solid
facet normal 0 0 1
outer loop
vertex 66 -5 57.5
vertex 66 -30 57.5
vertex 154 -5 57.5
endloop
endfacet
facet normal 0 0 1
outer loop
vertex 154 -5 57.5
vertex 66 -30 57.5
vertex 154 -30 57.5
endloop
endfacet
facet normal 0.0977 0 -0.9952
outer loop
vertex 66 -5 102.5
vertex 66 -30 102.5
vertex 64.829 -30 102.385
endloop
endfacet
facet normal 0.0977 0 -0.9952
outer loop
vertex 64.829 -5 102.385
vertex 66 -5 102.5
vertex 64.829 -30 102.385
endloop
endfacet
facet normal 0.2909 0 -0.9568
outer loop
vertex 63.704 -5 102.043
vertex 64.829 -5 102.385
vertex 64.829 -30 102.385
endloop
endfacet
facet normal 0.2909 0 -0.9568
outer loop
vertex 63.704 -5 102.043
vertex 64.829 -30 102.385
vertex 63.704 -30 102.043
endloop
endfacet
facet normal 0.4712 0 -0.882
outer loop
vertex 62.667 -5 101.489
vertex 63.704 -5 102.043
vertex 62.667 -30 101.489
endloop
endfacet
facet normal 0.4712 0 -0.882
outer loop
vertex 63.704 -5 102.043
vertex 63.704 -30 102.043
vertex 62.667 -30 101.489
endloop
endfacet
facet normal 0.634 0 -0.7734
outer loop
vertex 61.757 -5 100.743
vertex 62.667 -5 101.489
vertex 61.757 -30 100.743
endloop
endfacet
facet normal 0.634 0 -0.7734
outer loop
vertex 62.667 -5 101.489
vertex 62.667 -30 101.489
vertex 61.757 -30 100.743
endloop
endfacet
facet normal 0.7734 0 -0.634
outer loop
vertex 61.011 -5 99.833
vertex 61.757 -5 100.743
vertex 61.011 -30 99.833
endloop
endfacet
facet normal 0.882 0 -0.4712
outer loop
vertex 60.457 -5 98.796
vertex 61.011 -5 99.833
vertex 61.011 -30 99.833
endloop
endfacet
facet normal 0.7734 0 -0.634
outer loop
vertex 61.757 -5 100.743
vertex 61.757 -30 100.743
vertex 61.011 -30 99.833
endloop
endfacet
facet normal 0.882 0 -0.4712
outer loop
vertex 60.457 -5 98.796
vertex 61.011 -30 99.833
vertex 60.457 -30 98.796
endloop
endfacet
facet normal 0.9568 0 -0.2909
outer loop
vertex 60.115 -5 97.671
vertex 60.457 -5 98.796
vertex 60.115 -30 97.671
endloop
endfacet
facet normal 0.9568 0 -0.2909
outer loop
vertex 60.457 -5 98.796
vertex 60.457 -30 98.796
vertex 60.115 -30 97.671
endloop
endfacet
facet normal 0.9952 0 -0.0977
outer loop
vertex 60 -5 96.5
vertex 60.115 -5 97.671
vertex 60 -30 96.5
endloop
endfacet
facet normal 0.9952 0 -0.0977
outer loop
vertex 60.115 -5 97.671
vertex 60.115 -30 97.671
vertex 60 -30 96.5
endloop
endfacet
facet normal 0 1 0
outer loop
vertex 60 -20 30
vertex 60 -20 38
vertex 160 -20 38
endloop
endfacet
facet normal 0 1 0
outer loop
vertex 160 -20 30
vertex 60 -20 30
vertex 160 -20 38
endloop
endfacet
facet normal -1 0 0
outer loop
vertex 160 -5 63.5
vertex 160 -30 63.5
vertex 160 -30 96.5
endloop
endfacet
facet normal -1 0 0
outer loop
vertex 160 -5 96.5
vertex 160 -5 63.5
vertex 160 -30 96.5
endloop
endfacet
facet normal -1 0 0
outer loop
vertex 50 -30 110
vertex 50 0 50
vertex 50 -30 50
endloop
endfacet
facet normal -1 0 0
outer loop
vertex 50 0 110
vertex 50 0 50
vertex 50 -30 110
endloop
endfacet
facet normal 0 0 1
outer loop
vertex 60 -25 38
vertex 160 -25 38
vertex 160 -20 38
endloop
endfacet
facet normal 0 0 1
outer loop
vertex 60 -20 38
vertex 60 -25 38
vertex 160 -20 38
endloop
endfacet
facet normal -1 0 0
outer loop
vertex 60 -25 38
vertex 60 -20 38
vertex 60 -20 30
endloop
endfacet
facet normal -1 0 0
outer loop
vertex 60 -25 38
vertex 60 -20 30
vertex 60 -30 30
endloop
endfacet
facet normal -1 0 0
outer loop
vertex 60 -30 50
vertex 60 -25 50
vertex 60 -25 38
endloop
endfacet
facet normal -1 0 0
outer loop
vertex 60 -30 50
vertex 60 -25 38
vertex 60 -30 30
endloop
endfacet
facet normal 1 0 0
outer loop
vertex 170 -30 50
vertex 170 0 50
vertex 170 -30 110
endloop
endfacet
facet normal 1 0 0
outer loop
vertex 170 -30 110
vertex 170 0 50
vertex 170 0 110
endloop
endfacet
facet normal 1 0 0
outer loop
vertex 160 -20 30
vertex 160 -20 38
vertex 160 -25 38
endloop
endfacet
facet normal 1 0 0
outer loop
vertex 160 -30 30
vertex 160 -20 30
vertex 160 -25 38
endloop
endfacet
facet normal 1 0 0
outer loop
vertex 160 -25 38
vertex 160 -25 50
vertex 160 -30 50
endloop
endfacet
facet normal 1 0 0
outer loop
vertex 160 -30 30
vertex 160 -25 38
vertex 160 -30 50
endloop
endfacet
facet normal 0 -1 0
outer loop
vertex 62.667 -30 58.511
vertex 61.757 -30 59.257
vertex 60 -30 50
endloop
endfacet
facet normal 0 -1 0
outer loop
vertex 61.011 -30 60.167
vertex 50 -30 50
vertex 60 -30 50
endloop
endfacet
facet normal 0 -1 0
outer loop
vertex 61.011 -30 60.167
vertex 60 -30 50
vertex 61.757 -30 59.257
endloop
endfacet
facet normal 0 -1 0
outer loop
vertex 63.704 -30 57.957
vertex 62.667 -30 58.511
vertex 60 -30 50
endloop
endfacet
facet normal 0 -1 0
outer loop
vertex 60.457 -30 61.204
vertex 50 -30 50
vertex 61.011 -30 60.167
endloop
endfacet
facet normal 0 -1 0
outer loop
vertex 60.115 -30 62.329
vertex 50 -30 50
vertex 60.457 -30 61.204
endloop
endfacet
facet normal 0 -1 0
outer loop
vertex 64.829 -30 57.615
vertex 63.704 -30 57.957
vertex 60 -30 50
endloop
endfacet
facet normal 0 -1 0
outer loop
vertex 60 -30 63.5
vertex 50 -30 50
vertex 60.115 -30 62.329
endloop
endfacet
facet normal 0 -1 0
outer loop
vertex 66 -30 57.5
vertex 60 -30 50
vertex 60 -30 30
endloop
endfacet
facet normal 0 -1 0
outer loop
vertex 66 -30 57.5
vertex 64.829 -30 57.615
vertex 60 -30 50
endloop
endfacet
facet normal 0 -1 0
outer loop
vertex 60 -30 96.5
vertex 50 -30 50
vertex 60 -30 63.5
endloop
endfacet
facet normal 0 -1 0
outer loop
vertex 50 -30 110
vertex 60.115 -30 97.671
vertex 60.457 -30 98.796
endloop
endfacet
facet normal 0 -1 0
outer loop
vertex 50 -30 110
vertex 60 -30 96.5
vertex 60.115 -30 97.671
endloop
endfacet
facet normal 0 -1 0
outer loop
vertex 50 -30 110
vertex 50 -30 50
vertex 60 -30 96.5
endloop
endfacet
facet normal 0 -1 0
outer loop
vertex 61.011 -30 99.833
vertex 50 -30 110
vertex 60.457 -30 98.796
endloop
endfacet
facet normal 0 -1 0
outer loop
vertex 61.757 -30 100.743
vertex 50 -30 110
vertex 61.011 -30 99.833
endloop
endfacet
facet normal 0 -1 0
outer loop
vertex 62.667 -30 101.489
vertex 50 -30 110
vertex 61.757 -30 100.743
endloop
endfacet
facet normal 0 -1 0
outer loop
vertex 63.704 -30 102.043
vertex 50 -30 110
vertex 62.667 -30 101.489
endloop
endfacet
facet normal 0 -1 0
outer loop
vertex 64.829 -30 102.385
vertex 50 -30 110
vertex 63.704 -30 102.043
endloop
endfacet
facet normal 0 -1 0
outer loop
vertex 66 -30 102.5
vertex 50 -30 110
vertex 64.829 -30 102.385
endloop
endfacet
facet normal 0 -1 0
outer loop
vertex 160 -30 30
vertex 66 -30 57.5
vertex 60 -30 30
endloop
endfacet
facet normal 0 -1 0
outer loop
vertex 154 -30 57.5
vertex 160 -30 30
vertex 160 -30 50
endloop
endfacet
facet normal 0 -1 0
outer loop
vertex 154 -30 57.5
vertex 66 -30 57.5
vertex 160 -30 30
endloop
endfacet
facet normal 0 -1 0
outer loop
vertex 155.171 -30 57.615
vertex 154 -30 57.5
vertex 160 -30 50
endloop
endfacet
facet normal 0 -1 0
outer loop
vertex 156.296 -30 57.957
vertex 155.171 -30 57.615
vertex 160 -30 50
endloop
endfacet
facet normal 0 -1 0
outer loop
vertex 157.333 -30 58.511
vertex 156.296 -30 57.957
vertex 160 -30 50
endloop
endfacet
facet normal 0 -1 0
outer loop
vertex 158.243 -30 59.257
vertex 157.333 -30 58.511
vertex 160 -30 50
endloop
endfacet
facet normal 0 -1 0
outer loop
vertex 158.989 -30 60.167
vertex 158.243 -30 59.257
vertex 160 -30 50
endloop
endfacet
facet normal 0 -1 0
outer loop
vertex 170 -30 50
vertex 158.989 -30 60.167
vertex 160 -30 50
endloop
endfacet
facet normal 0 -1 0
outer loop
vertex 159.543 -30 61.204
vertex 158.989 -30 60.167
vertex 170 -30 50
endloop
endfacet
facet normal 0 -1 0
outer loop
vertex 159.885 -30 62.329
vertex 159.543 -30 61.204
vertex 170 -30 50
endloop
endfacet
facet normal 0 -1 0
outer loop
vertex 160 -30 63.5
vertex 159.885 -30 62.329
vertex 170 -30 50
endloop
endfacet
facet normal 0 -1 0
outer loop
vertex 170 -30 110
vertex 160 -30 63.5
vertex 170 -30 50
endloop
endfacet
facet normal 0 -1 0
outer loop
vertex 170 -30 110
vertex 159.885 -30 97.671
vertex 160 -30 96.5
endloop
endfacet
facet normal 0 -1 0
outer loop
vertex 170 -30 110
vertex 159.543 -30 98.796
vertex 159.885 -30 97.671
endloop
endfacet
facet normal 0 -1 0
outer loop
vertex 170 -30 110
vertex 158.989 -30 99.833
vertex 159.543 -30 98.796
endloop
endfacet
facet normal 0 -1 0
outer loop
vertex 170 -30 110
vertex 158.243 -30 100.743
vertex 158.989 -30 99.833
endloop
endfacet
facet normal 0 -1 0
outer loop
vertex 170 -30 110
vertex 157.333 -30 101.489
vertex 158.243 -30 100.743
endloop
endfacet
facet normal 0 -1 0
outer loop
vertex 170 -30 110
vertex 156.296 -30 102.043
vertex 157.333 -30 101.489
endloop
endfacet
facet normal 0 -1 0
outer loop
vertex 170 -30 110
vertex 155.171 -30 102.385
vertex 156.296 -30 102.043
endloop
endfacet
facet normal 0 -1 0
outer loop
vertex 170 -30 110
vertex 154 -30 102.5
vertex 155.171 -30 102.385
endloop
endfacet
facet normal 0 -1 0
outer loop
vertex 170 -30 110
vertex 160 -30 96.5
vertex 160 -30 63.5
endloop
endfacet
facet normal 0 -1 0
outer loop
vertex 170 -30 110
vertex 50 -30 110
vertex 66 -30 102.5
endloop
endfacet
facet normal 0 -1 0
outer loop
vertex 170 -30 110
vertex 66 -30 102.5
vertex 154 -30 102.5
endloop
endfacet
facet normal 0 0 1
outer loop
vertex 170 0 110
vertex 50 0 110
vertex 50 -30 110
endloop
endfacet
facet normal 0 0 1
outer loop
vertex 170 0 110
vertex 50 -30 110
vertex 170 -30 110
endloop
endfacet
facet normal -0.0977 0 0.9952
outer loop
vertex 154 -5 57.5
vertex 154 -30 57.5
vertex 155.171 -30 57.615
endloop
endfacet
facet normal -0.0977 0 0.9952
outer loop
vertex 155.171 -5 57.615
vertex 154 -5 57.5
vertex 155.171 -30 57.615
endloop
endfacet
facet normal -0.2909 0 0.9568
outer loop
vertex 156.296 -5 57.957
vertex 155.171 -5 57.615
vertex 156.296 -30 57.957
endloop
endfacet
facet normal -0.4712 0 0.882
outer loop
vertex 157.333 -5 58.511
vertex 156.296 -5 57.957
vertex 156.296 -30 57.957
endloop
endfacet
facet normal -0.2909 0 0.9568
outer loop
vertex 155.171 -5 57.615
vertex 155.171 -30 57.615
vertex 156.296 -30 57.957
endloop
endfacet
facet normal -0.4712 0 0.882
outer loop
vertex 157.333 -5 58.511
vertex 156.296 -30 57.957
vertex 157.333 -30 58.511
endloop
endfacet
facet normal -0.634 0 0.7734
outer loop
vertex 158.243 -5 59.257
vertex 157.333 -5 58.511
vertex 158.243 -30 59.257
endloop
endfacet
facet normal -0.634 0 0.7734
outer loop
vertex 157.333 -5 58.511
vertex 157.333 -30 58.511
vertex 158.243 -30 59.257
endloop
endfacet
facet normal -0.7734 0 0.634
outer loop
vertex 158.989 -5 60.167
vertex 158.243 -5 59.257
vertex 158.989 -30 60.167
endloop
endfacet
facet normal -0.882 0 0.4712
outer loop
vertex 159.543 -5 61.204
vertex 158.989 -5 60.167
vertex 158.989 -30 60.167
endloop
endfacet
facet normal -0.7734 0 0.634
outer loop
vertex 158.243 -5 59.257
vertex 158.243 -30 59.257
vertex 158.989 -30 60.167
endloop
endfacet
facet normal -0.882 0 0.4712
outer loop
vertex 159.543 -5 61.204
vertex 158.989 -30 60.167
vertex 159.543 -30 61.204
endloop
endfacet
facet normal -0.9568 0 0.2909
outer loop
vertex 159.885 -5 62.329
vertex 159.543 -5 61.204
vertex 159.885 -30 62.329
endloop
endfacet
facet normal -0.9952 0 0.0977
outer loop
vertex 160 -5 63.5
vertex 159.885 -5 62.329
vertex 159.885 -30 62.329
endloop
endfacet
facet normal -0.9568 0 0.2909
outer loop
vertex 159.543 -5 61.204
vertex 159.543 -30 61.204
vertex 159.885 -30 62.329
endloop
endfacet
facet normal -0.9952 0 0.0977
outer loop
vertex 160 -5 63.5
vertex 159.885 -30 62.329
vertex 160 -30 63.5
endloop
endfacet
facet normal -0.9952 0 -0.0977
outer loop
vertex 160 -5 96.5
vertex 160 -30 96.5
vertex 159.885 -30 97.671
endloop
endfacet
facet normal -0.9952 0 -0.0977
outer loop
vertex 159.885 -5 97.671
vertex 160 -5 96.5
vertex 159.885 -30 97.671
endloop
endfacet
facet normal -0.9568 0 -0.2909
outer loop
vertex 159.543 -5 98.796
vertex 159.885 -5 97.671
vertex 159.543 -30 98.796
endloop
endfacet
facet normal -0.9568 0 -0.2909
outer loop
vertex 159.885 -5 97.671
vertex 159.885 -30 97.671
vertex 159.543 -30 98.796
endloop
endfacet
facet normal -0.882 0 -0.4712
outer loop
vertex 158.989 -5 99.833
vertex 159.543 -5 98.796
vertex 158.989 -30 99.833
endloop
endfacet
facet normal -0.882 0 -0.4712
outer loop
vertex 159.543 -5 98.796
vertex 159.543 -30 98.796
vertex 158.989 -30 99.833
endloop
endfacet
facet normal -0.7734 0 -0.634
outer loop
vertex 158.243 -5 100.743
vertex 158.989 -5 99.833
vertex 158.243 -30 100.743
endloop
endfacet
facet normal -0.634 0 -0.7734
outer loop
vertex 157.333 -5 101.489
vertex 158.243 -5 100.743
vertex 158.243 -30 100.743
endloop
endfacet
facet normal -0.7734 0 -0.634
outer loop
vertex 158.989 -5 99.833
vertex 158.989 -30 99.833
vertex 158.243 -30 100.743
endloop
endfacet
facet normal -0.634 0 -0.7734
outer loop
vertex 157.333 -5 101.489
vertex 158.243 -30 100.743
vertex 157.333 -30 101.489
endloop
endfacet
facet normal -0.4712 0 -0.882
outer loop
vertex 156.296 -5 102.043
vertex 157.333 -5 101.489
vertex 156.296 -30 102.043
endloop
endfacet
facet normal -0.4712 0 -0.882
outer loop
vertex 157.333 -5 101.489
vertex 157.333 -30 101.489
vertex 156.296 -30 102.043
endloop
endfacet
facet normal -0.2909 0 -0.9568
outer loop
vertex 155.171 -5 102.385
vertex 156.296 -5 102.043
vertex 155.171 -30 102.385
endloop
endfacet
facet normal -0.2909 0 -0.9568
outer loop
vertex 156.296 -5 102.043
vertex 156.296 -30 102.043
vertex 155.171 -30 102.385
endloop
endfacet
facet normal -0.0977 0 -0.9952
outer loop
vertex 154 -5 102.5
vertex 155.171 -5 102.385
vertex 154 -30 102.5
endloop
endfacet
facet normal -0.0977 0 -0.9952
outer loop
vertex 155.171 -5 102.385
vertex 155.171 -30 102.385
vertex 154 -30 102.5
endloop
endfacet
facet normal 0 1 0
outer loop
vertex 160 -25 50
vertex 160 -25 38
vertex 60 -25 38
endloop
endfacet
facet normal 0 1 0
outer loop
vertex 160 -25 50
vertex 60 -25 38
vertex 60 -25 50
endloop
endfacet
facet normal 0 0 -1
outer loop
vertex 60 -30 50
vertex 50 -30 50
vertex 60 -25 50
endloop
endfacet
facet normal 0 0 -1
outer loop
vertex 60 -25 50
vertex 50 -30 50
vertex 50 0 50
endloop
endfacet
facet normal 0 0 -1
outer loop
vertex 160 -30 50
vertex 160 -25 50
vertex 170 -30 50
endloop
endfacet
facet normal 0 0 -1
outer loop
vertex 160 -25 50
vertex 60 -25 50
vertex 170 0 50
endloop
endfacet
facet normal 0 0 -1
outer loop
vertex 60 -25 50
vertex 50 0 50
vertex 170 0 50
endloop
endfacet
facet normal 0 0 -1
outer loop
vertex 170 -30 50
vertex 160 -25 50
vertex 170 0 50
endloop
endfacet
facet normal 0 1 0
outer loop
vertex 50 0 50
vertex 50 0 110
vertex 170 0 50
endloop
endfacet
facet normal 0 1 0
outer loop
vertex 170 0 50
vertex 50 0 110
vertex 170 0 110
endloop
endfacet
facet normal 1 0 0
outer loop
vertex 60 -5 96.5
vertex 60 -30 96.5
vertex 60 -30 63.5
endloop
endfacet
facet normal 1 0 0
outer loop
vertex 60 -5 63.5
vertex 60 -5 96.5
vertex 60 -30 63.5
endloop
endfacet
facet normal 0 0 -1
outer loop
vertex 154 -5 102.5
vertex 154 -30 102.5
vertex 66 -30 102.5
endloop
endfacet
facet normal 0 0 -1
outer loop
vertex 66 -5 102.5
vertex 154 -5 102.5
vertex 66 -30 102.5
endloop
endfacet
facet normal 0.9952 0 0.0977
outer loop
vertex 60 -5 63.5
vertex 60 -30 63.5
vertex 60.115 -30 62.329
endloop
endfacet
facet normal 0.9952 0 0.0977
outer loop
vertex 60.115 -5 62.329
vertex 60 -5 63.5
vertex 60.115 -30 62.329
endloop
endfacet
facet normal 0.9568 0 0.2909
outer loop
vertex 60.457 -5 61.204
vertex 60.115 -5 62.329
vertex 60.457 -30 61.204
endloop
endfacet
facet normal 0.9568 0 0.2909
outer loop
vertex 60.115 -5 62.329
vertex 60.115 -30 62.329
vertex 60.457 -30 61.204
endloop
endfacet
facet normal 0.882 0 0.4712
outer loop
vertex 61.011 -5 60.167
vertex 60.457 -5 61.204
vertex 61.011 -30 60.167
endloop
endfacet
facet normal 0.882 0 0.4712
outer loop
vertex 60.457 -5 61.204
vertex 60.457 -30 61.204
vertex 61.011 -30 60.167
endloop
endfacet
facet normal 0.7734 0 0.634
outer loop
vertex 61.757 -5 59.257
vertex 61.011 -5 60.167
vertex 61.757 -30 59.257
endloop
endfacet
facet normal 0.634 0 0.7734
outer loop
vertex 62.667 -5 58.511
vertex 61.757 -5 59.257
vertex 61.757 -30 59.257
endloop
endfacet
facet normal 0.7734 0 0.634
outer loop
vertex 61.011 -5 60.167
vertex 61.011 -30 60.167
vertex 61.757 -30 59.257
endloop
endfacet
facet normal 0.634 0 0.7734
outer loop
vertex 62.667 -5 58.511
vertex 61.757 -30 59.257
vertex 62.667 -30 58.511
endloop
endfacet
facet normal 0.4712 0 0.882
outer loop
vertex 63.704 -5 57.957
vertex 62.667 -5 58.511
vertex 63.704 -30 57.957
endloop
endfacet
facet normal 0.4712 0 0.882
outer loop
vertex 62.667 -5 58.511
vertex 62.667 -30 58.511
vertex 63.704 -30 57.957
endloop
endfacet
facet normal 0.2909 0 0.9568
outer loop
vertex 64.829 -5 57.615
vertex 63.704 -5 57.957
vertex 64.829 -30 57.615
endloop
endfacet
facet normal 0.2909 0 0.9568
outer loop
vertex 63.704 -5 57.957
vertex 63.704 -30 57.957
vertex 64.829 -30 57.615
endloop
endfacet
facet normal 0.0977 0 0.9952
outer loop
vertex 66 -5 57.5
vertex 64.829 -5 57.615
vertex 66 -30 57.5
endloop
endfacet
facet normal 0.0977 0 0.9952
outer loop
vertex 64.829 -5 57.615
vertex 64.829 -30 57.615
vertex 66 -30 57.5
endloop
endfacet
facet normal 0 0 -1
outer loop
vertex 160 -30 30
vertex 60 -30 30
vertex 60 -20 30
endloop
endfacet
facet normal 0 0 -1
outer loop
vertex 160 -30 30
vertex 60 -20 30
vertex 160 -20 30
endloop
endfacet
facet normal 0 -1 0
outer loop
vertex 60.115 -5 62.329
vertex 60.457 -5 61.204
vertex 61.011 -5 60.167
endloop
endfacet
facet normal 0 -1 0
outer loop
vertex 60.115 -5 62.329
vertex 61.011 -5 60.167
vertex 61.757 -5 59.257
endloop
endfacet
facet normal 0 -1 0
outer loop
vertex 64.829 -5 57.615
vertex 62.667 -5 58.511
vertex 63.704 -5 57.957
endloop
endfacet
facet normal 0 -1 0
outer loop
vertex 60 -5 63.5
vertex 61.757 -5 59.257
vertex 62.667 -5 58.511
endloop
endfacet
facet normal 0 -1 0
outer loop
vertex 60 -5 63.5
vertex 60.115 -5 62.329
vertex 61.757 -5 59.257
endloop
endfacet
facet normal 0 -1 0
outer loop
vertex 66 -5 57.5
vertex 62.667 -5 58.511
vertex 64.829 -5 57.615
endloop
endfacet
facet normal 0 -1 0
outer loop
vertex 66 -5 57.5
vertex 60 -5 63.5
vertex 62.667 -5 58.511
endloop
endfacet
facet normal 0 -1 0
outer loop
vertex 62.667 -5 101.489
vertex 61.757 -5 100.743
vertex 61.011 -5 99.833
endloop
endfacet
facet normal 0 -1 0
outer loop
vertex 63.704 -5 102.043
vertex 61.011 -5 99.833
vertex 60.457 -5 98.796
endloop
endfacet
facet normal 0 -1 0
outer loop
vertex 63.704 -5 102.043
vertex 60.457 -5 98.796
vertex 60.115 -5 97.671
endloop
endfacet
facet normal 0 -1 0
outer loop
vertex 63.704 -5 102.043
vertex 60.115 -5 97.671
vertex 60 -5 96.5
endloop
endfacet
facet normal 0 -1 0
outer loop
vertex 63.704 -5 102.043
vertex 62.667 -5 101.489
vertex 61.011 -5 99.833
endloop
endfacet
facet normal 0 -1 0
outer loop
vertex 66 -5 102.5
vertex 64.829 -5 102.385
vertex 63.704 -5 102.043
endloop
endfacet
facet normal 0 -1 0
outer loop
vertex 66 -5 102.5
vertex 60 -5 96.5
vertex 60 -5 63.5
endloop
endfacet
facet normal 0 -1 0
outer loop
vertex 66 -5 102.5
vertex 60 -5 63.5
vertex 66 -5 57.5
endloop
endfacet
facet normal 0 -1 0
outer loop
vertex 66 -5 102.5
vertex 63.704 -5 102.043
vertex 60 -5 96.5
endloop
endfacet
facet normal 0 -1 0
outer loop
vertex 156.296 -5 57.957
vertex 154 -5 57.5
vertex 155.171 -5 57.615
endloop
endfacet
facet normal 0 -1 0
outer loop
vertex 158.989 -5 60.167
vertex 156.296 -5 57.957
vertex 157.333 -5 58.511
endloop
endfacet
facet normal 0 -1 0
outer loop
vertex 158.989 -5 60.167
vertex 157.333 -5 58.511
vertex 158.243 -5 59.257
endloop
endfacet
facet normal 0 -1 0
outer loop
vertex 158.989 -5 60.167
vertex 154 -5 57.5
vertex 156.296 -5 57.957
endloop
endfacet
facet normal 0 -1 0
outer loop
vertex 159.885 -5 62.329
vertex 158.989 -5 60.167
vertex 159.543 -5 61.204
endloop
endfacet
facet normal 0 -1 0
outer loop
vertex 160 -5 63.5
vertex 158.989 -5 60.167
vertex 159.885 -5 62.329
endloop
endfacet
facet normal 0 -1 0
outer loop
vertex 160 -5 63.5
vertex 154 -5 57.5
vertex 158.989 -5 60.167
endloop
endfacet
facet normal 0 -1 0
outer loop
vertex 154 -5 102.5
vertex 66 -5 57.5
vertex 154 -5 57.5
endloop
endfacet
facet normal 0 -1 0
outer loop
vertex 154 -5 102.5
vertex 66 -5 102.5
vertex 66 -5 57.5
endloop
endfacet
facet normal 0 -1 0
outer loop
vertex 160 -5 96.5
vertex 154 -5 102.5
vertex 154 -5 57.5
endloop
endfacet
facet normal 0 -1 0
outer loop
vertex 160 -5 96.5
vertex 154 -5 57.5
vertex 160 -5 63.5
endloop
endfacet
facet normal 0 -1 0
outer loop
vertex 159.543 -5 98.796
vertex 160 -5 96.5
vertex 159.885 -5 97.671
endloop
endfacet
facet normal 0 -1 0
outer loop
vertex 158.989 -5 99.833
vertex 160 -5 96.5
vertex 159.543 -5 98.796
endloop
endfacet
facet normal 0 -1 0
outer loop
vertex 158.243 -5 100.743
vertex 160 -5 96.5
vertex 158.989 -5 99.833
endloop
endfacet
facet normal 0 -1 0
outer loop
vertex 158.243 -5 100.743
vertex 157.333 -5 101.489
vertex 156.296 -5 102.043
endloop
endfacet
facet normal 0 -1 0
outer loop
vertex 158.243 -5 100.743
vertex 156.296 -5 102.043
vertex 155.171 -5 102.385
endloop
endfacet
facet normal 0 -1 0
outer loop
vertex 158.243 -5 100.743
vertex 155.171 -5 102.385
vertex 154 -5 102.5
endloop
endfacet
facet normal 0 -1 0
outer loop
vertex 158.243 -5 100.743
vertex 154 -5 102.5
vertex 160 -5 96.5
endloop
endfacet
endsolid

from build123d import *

# Parameters (mm, degrees)
F0_W     = 120
F0_H     = 60
F1_DEPTH = 30
F3_DEPTH = 25
F4_W     = 100
F4_H     = 10
F5_DEPTH = 20
F6_W     = 5
F6_H     = 12
F7_DEPTH = 110.001


with BuildPart() as f1:
    # F0 (on Front) → F1 (new body)
    with BuildSketch(Plane.XZ):
        with Locations((110, 80)):
            Rectangle(F0_W, F0_H)
    extrude(amount=F1_DEPTH)

    # F2 (on face) → F3 (cut)
    with BuildSketch(Plane.XZ.offset(30)):
        with BuildLine():
            Line((66, 57.5), (154, 57.5))
            ThreePointArc((154, 57.5), (158.242641, 59.257359), (160, 63.5))
            Line((160, 63.5), (160, 96.5))
            ThreePointArc((160, 96.5), (158.242641, 100.742641), (154, 102.5))
            Line((154, 102.5), (66, 102.5))
            ThreePointArc((66, 102.5), (61.757359, 100.742641), (60, 96.5))
            Line((60, 96.5), (60, 63.5))
            ThreePointArc((60, 63.5), (61.757359, 59.257359), (66, 57.5))
        make_face()
    extrude(amount=-F3_DEPTH, mode=Mode.SUBTRACT)

    # F4 (on face) → F5 (join)
    with BuildSketch(Plane(origin=(0, 0, 50), x_dir=(1, 0, 0), z_dir=(0, 0, -1))):
        with Locations((110, 25)):
            Rectangle(F4_W, F4_H)
    extrude(amount=F5_DEPTH)

    # F6 (on face) → F7 (cut, through all)
    with BuildSketch(Plane.YZ.offset(160)):
        with Locations((-22.5, 44)):
            Rectangle(F6_W, F6_H)
    extrude(amount=-F7_DEPTH, mode=Mode.SUBTRACT)


solid = f1.part
